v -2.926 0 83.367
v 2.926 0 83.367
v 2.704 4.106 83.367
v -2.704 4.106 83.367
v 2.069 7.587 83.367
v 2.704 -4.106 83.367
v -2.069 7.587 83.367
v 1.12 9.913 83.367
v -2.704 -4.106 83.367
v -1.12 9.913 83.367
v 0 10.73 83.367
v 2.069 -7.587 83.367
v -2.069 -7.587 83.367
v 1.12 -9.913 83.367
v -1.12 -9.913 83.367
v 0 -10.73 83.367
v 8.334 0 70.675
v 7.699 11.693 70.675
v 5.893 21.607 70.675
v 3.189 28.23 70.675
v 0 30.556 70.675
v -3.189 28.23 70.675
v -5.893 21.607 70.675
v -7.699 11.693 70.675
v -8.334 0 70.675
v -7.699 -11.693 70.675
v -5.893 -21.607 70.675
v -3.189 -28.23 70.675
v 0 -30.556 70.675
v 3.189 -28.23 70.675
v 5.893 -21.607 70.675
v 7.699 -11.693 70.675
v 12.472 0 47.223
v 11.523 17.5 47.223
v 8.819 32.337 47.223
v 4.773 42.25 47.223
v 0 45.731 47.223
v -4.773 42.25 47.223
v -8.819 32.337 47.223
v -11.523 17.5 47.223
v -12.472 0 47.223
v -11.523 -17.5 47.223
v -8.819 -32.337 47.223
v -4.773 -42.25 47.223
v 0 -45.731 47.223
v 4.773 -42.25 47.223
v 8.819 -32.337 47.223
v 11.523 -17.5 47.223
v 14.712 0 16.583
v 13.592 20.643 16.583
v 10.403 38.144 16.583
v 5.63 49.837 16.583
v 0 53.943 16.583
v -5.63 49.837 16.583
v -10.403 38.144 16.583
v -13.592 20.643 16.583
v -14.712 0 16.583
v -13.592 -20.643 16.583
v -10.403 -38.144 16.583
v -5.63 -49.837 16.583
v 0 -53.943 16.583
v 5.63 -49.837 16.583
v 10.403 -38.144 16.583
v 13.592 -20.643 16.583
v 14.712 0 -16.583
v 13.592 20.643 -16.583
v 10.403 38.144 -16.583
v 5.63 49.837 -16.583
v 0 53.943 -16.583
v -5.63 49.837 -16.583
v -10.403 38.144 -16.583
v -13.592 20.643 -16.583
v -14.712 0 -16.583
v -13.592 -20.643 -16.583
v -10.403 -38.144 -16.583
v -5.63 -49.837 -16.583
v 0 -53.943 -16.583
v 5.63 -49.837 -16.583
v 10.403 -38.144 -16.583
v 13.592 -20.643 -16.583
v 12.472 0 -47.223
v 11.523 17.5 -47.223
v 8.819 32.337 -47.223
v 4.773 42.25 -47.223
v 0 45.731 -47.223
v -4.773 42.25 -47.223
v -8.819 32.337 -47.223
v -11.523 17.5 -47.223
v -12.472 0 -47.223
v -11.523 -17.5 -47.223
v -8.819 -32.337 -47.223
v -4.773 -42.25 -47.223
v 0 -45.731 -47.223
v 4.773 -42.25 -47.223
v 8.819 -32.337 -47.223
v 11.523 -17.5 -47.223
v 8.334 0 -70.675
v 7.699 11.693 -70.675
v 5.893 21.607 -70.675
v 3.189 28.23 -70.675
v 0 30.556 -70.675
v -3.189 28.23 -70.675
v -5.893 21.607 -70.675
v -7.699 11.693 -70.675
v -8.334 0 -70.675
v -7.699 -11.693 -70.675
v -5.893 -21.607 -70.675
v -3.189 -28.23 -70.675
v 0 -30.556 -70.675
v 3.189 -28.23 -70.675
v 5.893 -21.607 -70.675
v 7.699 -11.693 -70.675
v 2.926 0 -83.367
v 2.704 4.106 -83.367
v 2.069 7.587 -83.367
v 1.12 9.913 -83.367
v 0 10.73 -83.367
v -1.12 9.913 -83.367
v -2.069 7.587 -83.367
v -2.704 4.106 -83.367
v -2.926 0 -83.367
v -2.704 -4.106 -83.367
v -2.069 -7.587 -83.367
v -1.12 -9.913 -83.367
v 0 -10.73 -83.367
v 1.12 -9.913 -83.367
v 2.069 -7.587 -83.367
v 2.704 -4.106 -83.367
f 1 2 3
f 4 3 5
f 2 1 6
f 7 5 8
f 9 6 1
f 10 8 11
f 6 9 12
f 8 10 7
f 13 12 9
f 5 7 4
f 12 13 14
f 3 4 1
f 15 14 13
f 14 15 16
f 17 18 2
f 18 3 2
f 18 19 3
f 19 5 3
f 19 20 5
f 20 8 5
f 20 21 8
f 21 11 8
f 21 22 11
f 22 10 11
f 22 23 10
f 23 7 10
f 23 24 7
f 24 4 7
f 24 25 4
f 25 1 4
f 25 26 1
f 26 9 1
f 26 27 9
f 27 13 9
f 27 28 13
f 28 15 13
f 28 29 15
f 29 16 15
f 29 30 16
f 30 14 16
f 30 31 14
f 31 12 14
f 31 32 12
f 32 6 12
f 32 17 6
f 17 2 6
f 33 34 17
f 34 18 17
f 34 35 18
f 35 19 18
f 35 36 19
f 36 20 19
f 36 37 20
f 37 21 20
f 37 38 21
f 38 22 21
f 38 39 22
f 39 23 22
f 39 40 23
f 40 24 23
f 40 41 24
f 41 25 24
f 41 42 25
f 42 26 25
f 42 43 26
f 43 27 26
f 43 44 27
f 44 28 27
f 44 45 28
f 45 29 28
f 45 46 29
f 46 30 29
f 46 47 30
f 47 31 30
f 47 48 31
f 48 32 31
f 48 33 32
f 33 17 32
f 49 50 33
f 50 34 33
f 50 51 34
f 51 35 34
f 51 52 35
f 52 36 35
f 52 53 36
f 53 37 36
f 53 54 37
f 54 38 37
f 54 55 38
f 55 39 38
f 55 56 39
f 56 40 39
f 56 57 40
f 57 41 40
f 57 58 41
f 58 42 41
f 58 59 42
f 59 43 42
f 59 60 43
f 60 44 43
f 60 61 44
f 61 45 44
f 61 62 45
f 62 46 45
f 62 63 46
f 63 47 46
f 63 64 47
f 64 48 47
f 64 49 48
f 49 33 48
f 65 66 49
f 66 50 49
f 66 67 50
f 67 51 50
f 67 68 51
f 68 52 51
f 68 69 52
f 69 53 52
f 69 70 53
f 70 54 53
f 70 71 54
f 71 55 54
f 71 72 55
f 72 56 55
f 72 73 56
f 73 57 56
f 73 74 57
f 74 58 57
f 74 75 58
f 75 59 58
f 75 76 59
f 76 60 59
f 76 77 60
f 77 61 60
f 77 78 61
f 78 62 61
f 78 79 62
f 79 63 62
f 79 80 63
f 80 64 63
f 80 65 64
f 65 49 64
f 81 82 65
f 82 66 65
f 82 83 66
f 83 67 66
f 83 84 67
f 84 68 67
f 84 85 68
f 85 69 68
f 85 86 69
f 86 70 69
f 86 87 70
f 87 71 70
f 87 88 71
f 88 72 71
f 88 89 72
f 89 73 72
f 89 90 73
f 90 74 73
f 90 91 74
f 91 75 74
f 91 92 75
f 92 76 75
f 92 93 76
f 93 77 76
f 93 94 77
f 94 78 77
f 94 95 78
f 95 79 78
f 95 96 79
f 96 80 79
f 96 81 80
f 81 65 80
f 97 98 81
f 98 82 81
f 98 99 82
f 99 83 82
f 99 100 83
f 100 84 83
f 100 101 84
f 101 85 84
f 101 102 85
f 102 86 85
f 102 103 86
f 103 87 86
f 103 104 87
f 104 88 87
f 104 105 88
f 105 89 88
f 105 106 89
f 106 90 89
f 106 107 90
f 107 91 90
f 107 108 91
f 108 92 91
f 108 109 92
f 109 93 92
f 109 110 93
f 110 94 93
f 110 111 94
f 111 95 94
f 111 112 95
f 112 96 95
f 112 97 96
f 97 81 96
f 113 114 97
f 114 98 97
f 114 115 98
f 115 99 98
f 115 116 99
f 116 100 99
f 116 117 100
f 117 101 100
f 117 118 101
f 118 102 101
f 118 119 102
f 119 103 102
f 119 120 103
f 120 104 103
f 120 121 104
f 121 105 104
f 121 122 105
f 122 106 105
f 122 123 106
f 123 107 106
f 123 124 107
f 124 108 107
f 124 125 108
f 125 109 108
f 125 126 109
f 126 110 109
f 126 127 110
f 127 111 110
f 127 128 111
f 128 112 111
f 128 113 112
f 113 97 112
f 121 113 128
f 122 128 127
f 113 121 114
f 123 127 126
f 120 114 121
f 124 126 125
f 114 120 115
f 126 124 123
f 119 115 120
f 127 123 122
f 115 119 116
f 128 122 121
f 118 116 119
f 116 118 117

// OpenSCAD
// Generated by SolidPython 1.0.1 on 2020-07-29 00:46:45


scale(v = [3, 11, 17]) {
	sphere(r = 5);
}
/***********************************************
*********      SolidPython code:      **********
************************************************
 
# import packages: SolidPython
from solid import *
from solid.utils import *
from itertools import chain, combinations, permutations


class Resize:

    def __init__(self, scad_file):
        self.scad_file = scad_file
        #self.scad_file = import_scad(scad_file)
        # cone/cylinder param:
        self.r1 = 0
        self.r2 = 0
        self.h = 0
        # rectangular prism param:
        self.w = 0
        self.l = 0
        # ellipse param:
        self.r = 0

    # import OpenScad code (file name corresponds to shape)


    # classify shape + parameters
    def assign(self, param1, param2, param3):
        if self.scad_file == 'cone.scad':
            self.r1 = param1
            self.r2 = param2
            self.h = param3
        elif self.scad_file == 'cylinder.scad':
            self.r1 = param1
            self.r2 = param2
            self.h = param3
        elif self.scad_file == 'rectangularPrism.scad':
            self.h = param1
            self.l = param2
            self.w = param3
        else:
            self.r = param1
            self.h = param2

    # resize parameters
    def iterate(self):
        x = range(3, 20, 2)
        i = 1
        if self.scad_file == 'cone.scad':
            tempList = list(permutations(x, 2))
            for temp in tempList:
                param1 = temp[0]
                param2 = temp[1]
                filepath = 'produced_scad_files/' + 'cone' + str(param1) + '_' + str(param2) + '_' + '.scad'
                scad_render_to_file(cylinder(h=param1, r1=param2, r2=0), filepath)

        elif self.scad_file == 'cylinder.scad':
            tempList = list(permutations(x, 3))
            for temp in tempList:
                param1 = temp[0]
                param2 = temp[1]
                filepath = 'produced_scad_files/' + 'cylinder' + str(param1) + '_' + str(param2) + '_' + '.scad'
                scad_render_to_file(cylinder(h=param1, r1=param2, r2=param2), filepath)

        elif self.scad_file == 'rectangularPrism.scad':
            tempList = list(permutations(x, 3))
            for temp in tempList:
                param1 = temp[0]
                param2 = temp[1]
                param3 = temp[2]
                filepath = 'produced_scad_files/' + 'rectangularPrism' + str(param1) + '_' + str(param2) + '_' + str(
                    param3) + '.scad'
                scad_render_to_file(cube(size=(param1, param2, param3)), filepath)

        elif self.scad_file == 'ellipse.scad':
            tempList = list(permutations(x, 4))
            for temp in tempList:
                param1 = temp[0]
                param2 = temp[1]
                param3 = temp[2]
                param4 = temp[3]
                filepath = 'produced_scad_files/' + 'ellipse' + str(param1) + '_' + str(param2) + '_' + str(param3) + '_' + str(param4) + '.scad'
                scad_render_to_file(scale([param1, param2, param3])(sphere(r=param4)), filepath)

    def render_to_scadfile(self):
        scad_render_to_file(scad, 'example.scad') 
 
************************************************/
